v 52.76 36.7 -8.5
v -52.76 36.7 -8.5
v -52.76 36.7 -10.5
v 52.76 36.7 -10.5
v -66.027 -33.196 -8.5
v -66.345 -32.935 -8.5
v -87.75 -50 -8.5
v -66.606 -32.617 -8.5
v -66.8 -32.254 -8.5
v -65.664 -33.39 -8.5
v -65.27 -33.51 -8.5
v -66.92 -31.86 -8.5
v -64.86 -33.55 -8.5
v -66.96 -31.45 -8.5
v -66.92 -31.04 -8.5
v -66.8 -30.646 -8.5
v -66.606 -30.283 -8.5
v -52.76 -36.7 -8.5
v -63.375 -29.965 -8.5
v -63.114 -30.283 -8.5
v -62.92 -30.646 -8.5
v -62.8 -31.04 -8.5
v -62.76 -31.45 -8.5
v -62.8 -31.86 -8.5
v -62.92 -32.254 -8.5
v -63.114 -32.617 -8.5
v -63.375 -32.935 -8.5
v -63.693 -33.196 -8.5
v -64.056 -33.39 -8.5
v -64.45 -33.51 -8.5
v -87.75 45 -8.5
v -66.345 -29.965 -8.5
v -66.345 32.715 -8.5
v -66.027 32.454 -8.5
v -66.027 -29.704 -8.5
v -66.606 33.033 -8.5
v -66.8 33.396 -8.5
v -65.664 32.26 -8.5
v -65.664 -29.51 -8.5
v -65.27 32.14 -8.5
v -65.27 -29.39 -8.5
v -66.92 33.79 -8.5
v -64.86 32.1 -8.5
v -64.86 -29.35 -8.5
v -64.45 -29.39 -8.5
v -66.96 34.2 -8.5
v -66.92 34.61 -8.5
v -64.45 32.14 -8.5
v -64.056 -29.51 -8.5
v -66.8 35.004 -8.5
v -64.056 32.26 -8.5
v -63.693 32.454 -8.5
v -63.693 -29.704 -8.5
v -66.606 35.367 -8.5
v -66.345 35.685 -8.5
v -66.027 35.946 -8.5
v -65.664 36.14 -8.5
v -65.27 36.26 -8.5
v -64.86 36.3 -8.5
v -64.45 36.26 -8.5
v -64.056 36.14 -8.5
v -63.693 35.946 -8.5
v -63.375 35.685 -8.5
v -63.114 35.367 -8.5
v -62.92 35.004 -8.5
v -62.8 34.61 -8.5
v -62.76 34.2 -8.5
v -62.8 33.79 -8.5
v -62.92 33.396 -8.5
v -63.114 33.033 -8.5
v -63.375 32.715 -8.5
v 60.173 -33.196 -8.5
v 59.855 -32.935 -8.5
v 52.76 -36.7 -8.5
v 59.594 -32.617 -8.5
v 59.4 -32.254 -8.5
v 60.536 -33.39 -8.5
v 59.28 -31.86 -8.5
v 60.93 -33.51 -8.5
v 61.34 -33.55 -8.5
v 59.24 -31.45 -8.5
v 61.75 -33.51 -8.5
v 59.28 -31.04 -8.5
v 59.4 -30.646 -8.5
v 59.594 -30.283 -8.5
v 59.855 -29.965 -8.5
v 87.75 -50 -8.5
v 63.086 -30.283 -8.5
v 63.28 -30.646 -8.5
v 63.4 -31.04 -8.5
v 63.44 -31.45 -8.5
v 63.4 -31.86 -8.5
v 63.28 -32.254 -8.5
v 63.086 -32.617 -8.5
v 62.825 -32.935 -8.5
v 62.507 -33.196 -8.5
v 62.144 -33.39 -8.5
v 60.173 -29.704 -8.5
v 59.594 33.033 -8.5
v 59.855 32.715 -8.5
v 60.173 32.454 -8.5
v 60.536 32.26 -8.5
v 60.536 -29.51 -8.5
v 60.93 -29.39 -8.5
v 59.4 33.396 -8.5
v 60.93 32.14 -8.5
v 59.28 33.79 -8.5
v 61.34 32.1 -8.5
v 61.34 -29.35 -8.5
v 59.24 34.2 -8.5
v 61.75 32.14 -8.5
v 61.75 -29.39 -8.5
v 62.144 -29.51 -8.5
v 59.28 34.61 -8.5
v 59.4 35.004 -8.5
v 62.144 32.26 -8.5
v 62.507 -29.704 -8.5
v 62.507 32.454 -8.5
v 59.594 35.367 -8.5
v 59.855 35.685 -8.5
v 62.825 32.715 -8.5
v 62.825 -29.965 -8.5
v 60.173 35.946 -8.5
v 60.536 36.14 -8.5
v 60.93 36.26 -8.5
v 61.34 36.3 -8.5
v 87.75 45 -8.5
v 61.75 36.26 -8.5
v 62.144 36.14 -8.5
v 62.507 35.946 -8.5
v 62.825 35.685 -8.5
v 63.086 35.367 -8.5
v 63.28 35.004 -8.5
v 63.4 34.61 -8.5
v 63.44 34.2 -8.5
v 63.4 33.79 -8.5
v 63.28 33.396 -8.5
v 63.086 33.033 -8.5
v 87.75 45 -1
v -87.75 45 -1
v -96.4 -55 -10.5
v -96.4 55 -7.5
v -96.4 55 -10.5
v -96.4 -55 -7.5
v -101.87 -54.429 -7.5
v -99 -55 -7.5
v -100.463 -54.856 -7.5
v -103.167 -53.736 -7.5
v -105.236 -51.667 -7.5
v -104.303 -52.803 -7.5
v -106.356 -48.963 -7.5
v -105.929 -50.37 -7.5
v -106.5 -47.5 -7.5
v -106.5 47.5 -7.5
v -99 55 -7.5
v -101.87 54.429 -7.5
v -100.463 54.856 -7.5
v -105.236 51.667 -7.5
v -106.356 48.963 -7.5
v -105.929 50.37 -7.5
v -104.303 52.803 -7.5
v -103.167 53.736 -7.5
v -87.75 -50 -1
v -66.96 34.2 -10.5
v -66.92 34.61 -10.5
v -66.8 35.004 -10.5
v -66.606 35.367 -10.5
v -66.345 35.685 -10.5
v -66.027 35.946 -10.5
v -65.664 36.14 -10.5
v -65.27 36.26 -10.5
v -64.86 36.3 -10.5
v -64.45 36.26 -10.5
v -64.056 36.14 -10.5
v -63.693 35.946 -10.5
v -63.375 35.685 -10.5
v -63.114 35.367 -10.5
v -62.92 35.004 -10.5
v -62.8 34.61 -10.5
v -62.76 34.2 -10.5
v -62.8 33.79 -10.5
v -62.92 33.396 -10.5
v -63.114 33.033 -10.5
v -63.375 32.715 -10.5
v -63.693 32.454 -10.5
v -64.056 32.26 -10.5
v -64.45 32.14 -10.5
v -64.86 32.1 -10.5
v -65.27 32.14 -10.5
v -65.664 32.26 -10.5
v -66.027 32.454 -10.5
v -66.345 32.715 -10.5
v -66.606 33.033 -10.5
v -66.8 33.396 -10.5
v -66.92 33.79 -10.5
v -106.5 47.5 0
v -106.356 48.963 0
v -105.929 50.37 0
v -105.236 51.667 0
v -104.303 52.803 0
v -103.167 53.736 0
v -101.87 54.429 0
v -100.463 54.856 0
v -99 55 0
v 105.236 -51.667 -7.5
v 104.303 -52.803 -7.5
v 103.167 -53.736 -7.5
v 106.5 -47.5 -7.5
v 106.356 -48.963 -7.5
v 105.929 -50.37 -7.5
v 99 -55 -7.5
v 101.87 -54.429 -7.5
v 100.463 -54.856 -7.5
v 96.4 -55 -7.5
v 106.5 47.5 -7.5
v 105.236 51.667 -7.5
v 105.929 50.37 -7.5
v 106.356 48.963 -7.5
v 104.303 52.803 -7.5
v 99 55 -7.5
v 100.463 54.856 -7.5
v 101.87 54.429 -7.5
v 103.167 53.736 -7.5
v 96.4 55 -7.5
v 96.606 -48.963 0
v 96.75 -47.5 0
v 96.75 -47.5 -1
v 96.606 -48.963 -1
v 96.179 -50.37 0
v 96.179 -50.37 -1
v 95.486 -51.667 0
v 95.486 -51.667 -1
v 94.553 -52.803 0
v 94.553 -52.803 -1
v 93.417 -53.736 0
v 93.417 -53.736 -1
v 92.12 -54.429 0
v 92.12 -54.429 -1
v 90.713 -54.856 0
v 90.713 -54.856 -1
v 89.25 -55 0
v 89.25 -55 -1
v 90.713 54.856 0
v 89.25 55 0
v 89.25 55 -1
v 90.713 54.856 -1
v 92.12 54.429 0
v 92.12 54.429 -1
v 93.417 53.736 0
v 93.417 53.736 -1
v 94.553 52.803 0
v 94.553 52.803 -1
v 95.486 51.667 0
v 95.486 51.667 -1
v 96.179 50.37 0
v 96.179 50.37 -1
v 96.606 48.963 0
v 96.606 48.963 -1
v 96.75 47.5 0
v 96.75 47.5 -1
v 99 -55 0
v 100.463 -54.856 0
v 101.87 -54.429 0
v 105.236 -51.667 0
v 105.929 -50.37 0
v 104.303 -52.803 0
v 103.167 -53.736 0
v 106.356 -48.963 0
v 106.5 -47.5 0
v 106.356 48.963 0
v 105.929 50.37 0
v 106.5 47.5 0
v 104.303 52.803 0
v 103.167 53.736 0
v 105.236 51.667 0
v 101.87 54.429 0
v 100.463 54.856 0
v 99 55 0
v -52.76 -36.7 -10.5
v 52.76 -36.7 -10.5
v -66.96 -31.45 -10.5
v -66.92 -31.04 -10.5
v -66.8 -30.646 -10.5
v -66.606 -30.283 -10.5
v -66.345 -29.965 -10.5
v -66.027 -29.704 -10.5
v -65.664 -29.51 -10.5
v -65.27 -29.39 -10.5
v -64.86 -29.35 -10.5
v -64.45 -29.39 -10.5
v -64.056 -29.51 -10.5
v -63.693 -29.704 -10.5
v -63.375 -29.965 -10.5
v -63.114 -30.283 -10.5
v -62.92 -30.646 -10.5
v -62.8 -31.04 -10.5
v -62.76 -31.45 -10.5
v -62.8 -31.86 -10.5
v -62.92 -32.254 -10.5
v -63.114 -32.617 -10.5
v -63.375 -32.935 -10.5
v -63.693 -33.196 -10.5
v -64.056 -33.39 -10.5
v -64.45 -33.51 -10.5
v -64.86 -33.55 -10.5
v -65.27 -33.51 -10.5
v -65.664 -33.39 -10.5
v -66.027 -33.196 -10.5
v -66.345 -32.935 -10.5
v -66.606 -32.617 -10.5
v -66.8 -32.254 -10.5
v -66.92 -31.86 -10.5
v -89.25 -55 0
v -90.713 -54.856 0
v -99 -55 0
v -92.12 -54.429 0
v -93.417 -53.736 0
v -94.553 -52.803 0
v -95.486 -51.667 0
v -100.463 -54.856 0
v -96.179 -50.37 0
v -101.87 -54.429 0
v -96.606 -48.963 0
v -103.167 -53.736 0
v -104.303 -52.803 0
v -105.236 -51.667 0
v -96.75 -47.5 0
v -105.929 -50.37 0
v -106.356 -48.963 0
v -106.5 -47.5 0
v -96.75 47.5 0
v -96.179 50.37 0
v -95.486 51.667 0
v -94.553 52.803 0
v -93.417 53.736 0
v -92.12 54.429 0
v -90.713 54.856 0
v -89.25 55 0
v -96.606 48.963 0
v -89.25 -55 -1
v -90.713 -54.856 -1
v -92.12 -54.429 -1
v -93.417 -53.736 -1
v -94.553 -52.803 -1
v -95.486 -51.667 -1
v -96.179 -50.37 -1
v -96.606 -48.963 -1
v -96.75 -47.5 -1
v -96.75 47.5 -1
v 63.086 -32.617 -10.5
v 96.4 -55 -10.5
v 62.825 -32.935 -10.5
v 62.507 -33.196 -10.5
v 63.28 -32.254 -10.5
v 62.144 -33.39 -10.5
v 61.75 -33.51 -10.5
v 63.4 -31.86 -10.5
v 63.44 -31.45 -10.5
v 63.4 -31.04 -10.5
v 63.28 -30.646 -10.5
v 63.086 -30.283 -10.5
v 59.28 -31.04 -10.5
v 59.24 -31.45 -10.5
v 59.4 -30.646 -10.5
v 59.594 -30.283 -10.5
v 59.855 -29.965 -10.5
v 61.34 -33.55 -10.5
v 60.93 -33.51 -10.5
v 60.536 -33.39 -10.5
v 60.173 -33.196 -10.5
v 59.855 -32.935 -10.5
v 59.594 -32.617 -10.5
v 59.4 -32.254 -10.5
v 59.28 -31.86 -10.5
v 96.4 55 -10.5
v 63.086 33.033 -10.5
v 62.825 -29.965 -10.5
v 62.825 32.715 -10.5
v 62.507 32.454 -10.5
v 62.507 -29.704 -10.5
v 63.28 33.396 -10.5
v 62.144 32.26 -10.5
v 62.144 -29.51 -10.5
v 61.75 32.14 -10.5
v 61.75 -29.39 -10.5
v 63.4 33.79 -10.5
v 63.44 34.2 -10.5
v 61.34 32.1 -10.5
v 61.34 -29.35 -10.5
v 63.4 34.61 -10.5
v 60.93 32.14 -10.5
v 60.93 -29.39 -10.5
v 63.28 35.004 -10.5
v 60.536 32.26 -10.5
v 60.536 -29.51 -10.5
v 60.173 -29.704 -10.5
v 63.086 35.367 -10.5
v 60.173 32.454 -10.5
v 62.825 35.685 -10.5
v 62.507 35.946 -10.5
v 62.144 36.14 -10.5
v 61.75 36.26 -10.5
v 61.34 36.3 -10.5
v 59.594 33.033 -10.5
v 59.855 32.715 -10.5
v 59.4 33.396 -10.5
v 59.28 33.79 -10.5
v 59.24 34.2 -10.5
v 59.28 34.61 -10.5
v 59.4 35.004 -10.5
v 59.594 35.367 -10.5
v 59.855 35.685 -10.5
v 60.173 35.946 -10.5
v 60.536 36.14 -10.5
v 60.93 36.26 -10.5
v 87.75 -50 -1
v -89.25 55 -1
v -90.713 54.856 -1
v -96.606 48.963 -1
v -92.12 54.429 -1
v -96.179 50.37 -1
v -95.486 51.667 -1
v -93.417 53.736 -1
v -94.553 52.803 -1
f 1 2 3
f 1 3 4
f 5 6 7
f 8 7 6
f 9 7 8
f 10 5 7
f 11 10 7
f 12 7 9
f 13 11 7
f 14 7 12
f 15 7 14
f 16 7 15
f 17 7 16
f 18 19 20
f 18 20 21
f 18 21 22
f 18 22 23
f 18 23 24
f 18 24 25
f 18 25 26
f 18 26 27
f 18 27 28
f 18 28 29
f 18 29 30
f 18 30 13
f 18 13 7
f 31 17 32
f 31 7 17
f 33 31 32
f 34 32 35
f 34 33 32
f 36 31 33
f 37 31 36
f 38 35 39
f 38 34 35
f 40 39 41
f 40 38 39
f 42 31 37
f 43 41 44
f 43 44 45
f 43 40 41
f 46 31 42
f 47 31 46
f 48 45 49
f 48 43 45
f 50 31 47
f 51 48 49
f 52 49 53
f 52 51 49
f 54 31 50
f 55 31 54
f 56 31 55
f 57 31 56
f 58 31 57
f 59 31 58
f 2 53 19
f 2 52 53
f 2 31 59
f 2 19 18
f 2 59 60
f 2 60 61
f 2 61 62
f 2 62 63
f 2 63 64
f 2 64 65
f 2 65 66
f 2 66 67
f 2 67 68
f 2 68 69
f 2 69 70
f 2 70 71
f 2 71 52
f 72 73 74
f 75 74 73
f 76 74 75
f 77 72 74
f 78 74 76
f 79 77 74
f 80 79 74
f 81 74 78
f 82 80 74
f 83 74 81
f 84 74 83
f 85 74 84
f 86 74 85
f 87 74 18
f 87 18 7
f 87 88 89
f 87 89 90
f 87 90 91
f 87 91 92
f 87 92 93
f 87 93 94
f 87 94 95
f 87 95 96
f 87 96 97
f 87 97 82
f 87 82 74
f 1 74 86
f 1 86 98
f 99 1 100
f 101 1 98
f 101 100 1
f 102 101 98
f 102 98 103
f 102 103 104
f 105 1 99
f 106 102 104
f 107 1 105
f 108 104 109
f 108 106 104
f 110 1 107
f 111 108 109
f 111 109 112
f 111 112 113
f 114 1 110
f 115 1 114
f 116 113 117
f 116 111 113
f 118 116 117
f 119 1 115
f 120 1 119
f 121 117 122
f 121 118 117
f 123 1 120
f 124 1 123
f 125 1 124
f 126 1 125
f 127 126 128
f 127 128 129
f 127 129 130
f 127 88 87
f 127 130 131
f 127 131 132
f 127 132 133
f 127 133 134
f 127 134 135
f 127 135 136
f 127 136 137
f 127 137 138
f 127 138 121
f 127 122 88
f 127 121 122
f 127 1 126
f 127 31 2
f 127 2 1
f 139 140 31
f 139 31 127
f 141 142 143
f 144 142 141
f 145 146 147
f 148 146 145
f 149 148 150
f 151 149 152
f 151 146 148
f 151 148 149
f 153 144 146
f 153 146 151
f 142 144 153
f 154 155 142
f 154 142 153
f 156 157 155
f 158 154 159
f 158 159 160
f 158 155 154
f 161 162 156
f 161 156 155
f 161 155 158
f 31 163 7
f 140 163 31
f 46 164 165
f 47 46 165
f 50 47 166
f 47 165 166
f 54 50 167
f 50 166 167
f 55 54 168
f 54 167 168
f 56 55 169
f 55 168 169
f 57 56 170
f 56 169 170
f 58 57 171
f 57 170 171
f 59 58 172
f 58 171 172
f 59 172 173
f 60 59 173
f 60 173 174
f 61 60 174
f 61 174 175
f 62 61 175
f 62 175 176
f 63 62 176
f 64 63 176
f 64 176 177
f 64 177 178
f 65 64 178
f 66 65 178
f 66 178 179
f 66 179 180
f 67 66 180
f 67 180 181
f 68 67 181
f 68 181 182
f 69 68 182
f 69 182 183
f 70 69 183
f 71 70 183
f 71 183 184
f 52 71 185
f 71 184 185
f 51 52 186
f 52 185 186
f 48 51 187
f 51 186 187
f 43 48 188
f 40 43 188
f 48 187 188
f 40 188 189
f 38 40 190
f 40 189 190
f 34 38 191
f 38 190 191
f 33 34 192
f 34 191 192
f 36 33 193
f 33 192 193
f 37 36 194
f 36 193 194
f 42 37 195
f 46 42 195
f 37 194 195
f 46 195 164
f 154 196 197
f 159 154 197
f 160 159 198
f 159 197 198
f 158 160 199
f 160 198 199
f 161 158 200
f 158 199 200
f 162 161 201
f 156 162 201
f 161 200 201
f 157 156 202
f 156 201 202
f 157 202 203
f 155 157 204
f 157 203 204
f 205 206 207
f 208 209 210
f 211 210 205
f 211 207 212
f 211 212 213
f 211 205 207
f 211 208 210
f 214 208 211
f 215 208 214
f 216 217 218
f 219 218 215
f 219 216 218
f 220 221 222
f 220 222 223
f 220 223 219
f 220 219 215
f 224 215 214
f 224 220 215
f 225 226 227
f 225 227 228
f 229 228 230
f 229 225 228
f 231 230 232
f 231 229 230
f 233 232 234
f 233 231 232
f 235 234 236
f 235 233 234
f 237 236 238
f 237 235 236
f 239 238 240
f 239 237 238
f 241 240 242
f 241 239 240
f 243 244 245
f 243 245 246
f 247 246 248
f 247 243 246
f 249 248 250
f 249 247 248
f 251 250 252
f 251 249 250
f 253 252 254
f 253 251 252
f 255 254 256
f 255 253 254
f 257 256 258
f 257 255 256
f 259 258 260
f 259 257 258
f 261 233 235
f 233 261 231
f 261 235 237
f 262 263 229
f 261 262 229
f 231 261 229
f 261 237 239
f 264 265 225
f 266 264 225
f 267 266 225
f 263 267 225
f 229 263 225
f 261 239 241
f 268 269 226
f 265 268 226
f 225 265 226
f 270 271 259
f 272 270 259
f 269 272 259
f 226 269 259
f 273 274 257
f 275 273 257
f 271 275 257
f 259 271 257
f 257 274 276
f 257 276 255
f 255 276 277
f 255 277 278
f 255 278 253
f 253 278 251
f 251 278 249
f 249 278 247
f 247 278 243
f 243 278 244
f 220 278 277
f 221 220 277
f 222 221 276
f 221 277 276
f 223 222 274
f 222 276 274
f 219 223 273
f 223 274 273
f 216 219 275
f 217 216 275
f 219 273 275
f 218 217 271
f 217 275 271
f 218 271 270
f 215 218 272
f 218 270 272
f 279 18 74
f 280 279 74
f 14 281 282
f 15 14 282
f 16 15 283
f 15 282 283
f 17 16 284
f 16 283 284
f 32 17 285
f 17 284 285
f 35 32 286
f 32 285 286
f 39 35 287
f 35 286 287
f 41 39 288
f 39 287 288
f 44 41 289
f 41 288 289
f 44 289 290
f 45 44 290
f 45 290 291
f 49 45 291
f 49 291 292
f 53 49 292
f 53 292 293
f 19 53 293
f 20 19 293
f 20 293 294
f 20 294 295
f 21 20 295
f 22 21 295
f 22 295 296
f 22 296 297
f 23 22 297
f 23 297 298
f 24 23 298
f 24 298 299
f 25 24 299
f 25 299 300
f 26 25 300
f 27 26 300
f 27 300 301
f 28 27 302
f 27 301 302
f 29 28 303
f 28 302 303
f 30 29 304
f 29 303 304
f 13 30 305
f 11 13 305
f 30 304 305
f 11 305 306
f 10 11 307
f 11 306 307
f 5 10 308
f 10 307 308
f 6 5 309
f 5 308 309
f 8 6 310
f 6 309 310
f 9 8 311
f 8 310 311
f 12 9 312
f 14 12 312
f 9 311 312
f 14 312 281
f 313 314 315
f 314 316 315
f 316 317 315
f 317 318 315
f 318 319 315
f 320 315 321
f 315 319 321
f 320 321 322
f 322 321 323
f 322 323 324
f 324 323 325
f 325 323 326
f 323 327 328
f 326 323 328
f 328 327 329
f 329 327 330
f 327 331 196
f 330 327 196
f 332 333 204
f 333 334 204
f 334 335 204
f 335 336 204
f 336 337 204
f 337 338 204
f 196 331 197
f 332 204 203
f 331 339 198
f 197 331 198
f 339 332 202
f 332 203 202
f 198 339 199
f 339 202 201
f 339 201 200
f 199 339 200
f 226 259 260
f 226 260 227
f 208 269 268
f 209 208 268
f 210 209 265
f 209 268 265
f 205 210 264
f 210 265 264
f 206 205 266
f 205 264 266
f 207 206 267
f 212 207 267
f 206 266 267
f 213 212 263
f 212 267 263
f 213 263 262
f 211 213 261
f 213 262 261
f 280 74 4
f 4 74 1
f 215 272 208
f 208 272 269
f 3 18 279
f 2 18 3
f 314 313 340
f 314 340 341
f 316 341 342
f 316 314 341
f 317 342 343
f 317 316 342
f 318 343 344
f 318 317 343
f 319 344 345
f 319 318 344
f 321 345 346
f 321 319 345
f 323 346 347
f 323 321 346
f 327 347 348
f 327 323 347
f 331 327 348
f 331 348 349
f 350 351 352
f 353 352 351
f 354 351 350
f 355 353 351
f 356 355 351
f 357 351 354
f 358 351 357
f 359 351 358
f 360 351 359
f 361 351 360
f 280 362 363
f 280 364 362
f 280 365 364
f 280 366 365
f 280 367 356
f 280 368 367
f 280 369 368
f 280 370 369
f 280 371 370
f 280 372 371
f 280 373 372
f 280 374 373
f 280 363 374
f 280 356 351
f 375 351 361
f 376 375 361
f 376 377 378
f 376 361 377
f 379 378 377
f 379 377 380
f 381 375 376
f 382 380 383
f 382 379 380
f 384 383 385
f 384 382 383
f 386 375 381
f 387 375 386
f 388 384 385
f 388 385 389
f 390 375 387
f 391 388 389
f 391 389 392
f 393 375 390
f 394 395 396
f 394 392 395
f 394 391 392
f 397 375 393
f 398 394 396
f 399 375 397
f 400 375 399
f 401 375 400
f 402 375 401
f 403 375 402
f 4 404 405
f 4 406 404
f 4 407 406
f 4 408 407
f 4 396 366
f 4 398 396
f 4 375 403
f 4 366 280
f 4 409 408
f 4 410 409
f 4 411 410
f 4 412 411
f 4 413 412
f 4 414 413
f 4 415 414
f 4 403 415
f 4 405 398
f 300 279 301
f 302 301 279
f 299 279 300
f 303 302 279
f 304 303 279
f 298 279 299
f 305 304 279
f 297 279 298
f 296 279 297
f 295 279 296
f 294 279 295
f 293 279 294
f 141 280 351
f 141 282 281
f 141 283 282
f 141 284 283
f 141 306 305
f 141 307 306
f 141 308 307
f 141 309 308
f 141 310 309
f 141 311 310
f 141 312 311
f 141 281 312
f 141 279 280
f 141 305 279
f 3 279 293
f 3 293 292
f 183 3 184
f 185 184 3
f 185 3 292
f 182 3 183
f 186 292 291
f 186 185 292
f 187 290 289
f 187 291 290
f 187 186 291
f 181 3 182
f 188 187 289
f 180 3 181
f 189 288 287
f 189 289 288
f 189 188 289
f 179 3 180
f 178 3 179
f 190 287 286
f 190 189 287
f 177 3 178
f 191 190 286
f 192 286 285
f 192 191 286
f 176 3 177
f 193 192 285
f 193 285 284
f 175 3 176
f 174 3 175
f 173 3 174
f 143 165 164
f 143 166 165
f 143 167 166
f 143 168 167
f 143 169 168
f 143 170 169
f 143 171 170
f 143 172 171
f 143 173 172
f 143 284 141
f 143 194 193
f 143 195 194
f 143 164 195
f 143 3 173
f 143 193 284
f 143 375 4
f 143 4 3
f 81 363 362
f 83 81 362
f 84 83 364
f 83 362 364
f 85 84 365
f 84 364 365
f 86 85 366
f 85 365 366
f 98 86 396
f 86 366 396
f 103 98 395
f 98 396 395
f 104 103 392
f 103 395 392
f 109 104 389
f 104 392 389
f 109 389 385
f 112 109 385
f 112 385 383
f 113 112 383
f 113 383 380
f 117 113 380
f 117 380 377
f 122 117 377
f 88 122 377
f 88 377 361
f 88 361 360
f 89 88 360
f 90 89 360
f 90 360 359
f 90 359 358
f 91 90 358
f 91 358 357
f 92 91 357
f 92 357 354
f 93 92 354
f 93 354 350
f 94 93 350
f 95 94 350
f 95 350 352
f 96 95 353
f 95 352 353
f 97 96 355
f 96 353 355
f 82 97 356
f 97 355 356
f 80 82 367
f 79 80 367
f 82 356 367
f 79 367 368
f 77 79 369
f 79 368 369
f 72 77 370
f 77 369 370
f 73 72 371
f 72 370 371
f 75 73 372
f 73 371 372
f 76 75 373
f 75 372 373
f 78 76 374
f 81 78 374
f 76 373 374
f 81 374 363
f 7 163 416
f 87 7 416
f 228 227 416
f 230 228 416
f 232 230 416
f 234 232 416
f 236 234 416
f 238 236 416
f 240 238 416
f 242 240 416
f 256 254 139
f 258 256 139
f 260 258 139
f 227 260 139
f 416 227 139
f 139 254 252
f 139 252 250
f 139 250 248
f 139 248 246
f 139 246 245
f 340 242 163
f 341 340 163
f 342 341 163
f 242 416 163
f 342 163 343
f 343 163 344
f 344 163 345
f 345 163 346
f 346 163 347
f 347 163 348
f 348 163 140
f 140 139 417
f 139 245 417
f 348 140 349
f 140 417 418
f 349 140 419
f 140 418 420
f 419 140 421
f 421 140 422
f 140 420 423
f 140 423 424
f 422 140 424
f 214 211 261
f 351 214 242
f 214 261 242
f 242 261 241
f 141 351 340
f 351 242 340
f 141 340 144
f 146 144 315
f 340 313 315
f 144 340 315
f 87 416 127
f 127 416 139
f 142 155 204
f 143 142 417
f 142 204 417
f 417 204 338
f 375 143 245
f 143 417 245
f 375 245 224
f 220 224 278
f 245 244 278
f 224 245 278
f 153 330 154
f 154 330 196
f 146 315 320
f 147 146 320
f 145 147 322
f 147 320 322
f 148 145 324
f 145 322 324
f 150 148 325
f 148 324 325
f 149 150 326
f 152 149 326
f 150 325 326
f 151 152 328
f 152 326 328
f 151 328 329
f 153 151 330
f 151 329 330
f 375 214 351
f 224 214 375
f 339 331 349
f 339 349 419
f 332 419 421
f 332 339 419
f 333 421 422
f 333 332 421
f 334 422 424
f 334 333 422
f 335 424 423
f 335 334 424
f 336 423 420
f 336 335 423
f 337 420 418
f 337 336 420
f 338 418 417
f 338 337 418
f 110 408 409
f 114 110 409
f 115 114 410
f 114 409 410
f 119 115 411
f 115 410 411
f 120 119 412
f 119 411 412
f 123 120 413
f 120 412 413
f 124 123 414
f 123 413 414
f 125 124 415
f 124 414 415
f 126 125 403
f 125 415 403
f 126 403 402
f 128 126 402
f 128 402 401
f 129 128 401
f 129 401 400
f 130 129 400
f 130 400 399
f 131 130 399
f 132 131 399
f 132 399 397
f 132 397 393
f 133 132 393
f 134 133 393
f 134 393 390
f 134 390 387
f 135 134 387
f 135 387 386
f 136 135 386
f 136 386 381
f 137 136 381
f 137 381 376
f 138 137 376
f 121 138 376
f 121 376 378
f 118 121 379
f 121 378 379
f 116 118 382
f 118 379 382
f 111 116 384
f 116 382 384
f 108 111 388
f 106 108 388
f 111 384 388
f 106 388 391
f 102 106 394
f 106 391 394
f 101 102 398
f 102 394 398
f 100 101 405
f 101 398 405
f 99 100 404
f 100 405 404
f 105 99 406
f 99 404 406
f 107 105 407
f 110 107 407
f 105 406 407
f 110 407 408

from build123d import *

# Parameters (mm, degrees)
BOSS_EXTRUDE1_DEPTH       = 10.5
CUT_EXTRUDE1_DEPTH        = 1
M5X0_8_TAPPED_HOLE1_D     = 4.2
M5X0_8_TAPPED_HOLE1_DEPTH = 12.4
M5X0_8_TAPPED_HOLE1_TIP   = 1.2618073
SKETCH7_W                 = 105.52
SKETCH7_H                 = 73.399079938
CUT_EXTRUDE2_DEPTH        = 121.239344642
SKETCH9_W                 = 175.5
SKETCH9_H                 = 95
CUT_EXTRUDE3_DEPTH        = 7.5
CUT_EXTRUDE4_START        = -3
CUT_EXTRUDE4_DEPTH        = 3


with BuildPart() as part:
    # Sketch1 → Boss-Extrude1 (new body)
    with BuildSketch(Plane.XY):
        with BuildLine():
            Line((-99, 55), (99, 55))
            ThreePointArc((99, 55), (104.303300859, 52.803300859), (106.5, 47.5))
            Line((106.5, 47.5), (106.5, -47.5))
            ThreePointArc((106.5, -47.5), (104.303300859, -52.803300859), (99, -55))
            Line((99, -55), (-99, -55))
            ThreePointArc((-99, -55), (-104.303300859, -52.803300859), (-106.5, -47.5))
            Line((-106.5, -47.5), (-106.5, 47.5))
            ThreePointArc((-106.5, 47.5), (-104.303300859, 52.803300859), (-99, 55))
        make_face()
    extrude(amount=-BOSS_EXTRUDE1_DEPTH)

    # Sketch2 → Cut-Extrude1 (cut)
    with BuildSketch(Plane.XY):
        with BuildLine():
            Line((-89.25, 55), (89.25, 55))
            ThreePointArc((89.25, 55), (94.553300859, 52.803300859), (96.75, 47.5))
            Line((96.75, 47.5), (96.75, -47.5))
            ThreePointArc((96.75, -47.5), (94.553300859, -52.803300859), (89.25, -55))
            Line((89.25, -55), (-89.25, -55))
            ThreePointArc((-89.25, -55), (-94.553300859, -52.803300859), (-96.75, -47.5))
            Line((-96.75, -47.5), (-96.75, 47.5))
            ThreePointArc((-96.75, 47.5), (-94.553300859, 52.803300859), (-89.25, 55))
        make_face()
    extrude(amount=-CUT_EXTRUDE1_DEPTH, mode=Mode.SUBTRACT)

    # M5x0.8 Tapped Hole1
    with Locations(Plane.XY.offset(-1)):
        with Locations((-64.86, 34.2), (61.34, 34.2), (61.34, -31.45), (-64.86, -31.45)):
            Hole(M5X0_8_TAPPED_HOLE1_D / 2, depth=M5X0_8_TAPPED_HOLE1_DEPTH)
            with Locations((0, 0, -(M5X0_8_TAPPED_HOLE1_DEPTH + M5X0_8_TAPPED_HOLE1_TIP / 2))):  # 118° drill point
                Cone(0, M5X0_8_TAPPED_HOLE1_D / 2, M5X0_8_TAPPED_HOLE1_TIP, mode=Mode.SUBTRACT)

    # Sketch7 → Cut-Extrude2 (cut, through all)
    with BuildSketch(Plane.XY.offset(-1)):
        Rectangle(SKETCH7_W, SKETCH7_H)
    extrude(amount=-CUT_EXTRUDE2_DEPTH, mode=Mode.SUBTRACT)

    # Sketch9 → Cut-Extrude3 (cut)
    with BuildSketch(Plane.XY.offset(-1)):
        with Locations((0, -2.5)):
            Rectangle(SKETCH9_W, SKETCH9_H)
    extrude(amount=-CUT_EXTRUDE3_DEPTH, mode=Mode.SUBTRACT)

    # Sketch10 → Cut-Extrude4 (cut)
    with BuildSketch(Plane(origin=(0, 0, -10.5), x_dir=(-1, 0, 0), z_dir=(0, 0, -1)).offset(CUT_EXTRUDE4_START)):
        with BuildLine():
            Line((-96.4, 55), (-99, 55))
            ThreePointArc((-99, 55), (-104.303300859, 52.803300859), (-106.5, 47.5))
            Line((-106.5, 47.5), (-106.5, -47.5))
            ThreePointArc((-106.5, -47.5), (-104.303300859, -52.803300859), (-99, -55))
            Line((-99, -55), (-96.4, -55))
            Line((-96.4, -55), (-96.4, 55))
        make_face()
        with BuildLine():
            Line((96.4, -55), (99, -55))
            ThreePointArc((99, -55), (104.303300859, -52.803300859), (106.5, -47.5))
            Line((106.5, -47.5), (106.5, 47.5))
            ThreePointArc((106.5, 47.5), (104.303300859, 52.803300859), (99, 55))
            Line((99, 55), (96.4, 55))
            Line((96.4, 55), (96.4, -55))
        make_face()
    extrude(amount=CUT_EXTRUDE4_DEPTH, mode=Mode.SUBTRACT)


solid = part.part
